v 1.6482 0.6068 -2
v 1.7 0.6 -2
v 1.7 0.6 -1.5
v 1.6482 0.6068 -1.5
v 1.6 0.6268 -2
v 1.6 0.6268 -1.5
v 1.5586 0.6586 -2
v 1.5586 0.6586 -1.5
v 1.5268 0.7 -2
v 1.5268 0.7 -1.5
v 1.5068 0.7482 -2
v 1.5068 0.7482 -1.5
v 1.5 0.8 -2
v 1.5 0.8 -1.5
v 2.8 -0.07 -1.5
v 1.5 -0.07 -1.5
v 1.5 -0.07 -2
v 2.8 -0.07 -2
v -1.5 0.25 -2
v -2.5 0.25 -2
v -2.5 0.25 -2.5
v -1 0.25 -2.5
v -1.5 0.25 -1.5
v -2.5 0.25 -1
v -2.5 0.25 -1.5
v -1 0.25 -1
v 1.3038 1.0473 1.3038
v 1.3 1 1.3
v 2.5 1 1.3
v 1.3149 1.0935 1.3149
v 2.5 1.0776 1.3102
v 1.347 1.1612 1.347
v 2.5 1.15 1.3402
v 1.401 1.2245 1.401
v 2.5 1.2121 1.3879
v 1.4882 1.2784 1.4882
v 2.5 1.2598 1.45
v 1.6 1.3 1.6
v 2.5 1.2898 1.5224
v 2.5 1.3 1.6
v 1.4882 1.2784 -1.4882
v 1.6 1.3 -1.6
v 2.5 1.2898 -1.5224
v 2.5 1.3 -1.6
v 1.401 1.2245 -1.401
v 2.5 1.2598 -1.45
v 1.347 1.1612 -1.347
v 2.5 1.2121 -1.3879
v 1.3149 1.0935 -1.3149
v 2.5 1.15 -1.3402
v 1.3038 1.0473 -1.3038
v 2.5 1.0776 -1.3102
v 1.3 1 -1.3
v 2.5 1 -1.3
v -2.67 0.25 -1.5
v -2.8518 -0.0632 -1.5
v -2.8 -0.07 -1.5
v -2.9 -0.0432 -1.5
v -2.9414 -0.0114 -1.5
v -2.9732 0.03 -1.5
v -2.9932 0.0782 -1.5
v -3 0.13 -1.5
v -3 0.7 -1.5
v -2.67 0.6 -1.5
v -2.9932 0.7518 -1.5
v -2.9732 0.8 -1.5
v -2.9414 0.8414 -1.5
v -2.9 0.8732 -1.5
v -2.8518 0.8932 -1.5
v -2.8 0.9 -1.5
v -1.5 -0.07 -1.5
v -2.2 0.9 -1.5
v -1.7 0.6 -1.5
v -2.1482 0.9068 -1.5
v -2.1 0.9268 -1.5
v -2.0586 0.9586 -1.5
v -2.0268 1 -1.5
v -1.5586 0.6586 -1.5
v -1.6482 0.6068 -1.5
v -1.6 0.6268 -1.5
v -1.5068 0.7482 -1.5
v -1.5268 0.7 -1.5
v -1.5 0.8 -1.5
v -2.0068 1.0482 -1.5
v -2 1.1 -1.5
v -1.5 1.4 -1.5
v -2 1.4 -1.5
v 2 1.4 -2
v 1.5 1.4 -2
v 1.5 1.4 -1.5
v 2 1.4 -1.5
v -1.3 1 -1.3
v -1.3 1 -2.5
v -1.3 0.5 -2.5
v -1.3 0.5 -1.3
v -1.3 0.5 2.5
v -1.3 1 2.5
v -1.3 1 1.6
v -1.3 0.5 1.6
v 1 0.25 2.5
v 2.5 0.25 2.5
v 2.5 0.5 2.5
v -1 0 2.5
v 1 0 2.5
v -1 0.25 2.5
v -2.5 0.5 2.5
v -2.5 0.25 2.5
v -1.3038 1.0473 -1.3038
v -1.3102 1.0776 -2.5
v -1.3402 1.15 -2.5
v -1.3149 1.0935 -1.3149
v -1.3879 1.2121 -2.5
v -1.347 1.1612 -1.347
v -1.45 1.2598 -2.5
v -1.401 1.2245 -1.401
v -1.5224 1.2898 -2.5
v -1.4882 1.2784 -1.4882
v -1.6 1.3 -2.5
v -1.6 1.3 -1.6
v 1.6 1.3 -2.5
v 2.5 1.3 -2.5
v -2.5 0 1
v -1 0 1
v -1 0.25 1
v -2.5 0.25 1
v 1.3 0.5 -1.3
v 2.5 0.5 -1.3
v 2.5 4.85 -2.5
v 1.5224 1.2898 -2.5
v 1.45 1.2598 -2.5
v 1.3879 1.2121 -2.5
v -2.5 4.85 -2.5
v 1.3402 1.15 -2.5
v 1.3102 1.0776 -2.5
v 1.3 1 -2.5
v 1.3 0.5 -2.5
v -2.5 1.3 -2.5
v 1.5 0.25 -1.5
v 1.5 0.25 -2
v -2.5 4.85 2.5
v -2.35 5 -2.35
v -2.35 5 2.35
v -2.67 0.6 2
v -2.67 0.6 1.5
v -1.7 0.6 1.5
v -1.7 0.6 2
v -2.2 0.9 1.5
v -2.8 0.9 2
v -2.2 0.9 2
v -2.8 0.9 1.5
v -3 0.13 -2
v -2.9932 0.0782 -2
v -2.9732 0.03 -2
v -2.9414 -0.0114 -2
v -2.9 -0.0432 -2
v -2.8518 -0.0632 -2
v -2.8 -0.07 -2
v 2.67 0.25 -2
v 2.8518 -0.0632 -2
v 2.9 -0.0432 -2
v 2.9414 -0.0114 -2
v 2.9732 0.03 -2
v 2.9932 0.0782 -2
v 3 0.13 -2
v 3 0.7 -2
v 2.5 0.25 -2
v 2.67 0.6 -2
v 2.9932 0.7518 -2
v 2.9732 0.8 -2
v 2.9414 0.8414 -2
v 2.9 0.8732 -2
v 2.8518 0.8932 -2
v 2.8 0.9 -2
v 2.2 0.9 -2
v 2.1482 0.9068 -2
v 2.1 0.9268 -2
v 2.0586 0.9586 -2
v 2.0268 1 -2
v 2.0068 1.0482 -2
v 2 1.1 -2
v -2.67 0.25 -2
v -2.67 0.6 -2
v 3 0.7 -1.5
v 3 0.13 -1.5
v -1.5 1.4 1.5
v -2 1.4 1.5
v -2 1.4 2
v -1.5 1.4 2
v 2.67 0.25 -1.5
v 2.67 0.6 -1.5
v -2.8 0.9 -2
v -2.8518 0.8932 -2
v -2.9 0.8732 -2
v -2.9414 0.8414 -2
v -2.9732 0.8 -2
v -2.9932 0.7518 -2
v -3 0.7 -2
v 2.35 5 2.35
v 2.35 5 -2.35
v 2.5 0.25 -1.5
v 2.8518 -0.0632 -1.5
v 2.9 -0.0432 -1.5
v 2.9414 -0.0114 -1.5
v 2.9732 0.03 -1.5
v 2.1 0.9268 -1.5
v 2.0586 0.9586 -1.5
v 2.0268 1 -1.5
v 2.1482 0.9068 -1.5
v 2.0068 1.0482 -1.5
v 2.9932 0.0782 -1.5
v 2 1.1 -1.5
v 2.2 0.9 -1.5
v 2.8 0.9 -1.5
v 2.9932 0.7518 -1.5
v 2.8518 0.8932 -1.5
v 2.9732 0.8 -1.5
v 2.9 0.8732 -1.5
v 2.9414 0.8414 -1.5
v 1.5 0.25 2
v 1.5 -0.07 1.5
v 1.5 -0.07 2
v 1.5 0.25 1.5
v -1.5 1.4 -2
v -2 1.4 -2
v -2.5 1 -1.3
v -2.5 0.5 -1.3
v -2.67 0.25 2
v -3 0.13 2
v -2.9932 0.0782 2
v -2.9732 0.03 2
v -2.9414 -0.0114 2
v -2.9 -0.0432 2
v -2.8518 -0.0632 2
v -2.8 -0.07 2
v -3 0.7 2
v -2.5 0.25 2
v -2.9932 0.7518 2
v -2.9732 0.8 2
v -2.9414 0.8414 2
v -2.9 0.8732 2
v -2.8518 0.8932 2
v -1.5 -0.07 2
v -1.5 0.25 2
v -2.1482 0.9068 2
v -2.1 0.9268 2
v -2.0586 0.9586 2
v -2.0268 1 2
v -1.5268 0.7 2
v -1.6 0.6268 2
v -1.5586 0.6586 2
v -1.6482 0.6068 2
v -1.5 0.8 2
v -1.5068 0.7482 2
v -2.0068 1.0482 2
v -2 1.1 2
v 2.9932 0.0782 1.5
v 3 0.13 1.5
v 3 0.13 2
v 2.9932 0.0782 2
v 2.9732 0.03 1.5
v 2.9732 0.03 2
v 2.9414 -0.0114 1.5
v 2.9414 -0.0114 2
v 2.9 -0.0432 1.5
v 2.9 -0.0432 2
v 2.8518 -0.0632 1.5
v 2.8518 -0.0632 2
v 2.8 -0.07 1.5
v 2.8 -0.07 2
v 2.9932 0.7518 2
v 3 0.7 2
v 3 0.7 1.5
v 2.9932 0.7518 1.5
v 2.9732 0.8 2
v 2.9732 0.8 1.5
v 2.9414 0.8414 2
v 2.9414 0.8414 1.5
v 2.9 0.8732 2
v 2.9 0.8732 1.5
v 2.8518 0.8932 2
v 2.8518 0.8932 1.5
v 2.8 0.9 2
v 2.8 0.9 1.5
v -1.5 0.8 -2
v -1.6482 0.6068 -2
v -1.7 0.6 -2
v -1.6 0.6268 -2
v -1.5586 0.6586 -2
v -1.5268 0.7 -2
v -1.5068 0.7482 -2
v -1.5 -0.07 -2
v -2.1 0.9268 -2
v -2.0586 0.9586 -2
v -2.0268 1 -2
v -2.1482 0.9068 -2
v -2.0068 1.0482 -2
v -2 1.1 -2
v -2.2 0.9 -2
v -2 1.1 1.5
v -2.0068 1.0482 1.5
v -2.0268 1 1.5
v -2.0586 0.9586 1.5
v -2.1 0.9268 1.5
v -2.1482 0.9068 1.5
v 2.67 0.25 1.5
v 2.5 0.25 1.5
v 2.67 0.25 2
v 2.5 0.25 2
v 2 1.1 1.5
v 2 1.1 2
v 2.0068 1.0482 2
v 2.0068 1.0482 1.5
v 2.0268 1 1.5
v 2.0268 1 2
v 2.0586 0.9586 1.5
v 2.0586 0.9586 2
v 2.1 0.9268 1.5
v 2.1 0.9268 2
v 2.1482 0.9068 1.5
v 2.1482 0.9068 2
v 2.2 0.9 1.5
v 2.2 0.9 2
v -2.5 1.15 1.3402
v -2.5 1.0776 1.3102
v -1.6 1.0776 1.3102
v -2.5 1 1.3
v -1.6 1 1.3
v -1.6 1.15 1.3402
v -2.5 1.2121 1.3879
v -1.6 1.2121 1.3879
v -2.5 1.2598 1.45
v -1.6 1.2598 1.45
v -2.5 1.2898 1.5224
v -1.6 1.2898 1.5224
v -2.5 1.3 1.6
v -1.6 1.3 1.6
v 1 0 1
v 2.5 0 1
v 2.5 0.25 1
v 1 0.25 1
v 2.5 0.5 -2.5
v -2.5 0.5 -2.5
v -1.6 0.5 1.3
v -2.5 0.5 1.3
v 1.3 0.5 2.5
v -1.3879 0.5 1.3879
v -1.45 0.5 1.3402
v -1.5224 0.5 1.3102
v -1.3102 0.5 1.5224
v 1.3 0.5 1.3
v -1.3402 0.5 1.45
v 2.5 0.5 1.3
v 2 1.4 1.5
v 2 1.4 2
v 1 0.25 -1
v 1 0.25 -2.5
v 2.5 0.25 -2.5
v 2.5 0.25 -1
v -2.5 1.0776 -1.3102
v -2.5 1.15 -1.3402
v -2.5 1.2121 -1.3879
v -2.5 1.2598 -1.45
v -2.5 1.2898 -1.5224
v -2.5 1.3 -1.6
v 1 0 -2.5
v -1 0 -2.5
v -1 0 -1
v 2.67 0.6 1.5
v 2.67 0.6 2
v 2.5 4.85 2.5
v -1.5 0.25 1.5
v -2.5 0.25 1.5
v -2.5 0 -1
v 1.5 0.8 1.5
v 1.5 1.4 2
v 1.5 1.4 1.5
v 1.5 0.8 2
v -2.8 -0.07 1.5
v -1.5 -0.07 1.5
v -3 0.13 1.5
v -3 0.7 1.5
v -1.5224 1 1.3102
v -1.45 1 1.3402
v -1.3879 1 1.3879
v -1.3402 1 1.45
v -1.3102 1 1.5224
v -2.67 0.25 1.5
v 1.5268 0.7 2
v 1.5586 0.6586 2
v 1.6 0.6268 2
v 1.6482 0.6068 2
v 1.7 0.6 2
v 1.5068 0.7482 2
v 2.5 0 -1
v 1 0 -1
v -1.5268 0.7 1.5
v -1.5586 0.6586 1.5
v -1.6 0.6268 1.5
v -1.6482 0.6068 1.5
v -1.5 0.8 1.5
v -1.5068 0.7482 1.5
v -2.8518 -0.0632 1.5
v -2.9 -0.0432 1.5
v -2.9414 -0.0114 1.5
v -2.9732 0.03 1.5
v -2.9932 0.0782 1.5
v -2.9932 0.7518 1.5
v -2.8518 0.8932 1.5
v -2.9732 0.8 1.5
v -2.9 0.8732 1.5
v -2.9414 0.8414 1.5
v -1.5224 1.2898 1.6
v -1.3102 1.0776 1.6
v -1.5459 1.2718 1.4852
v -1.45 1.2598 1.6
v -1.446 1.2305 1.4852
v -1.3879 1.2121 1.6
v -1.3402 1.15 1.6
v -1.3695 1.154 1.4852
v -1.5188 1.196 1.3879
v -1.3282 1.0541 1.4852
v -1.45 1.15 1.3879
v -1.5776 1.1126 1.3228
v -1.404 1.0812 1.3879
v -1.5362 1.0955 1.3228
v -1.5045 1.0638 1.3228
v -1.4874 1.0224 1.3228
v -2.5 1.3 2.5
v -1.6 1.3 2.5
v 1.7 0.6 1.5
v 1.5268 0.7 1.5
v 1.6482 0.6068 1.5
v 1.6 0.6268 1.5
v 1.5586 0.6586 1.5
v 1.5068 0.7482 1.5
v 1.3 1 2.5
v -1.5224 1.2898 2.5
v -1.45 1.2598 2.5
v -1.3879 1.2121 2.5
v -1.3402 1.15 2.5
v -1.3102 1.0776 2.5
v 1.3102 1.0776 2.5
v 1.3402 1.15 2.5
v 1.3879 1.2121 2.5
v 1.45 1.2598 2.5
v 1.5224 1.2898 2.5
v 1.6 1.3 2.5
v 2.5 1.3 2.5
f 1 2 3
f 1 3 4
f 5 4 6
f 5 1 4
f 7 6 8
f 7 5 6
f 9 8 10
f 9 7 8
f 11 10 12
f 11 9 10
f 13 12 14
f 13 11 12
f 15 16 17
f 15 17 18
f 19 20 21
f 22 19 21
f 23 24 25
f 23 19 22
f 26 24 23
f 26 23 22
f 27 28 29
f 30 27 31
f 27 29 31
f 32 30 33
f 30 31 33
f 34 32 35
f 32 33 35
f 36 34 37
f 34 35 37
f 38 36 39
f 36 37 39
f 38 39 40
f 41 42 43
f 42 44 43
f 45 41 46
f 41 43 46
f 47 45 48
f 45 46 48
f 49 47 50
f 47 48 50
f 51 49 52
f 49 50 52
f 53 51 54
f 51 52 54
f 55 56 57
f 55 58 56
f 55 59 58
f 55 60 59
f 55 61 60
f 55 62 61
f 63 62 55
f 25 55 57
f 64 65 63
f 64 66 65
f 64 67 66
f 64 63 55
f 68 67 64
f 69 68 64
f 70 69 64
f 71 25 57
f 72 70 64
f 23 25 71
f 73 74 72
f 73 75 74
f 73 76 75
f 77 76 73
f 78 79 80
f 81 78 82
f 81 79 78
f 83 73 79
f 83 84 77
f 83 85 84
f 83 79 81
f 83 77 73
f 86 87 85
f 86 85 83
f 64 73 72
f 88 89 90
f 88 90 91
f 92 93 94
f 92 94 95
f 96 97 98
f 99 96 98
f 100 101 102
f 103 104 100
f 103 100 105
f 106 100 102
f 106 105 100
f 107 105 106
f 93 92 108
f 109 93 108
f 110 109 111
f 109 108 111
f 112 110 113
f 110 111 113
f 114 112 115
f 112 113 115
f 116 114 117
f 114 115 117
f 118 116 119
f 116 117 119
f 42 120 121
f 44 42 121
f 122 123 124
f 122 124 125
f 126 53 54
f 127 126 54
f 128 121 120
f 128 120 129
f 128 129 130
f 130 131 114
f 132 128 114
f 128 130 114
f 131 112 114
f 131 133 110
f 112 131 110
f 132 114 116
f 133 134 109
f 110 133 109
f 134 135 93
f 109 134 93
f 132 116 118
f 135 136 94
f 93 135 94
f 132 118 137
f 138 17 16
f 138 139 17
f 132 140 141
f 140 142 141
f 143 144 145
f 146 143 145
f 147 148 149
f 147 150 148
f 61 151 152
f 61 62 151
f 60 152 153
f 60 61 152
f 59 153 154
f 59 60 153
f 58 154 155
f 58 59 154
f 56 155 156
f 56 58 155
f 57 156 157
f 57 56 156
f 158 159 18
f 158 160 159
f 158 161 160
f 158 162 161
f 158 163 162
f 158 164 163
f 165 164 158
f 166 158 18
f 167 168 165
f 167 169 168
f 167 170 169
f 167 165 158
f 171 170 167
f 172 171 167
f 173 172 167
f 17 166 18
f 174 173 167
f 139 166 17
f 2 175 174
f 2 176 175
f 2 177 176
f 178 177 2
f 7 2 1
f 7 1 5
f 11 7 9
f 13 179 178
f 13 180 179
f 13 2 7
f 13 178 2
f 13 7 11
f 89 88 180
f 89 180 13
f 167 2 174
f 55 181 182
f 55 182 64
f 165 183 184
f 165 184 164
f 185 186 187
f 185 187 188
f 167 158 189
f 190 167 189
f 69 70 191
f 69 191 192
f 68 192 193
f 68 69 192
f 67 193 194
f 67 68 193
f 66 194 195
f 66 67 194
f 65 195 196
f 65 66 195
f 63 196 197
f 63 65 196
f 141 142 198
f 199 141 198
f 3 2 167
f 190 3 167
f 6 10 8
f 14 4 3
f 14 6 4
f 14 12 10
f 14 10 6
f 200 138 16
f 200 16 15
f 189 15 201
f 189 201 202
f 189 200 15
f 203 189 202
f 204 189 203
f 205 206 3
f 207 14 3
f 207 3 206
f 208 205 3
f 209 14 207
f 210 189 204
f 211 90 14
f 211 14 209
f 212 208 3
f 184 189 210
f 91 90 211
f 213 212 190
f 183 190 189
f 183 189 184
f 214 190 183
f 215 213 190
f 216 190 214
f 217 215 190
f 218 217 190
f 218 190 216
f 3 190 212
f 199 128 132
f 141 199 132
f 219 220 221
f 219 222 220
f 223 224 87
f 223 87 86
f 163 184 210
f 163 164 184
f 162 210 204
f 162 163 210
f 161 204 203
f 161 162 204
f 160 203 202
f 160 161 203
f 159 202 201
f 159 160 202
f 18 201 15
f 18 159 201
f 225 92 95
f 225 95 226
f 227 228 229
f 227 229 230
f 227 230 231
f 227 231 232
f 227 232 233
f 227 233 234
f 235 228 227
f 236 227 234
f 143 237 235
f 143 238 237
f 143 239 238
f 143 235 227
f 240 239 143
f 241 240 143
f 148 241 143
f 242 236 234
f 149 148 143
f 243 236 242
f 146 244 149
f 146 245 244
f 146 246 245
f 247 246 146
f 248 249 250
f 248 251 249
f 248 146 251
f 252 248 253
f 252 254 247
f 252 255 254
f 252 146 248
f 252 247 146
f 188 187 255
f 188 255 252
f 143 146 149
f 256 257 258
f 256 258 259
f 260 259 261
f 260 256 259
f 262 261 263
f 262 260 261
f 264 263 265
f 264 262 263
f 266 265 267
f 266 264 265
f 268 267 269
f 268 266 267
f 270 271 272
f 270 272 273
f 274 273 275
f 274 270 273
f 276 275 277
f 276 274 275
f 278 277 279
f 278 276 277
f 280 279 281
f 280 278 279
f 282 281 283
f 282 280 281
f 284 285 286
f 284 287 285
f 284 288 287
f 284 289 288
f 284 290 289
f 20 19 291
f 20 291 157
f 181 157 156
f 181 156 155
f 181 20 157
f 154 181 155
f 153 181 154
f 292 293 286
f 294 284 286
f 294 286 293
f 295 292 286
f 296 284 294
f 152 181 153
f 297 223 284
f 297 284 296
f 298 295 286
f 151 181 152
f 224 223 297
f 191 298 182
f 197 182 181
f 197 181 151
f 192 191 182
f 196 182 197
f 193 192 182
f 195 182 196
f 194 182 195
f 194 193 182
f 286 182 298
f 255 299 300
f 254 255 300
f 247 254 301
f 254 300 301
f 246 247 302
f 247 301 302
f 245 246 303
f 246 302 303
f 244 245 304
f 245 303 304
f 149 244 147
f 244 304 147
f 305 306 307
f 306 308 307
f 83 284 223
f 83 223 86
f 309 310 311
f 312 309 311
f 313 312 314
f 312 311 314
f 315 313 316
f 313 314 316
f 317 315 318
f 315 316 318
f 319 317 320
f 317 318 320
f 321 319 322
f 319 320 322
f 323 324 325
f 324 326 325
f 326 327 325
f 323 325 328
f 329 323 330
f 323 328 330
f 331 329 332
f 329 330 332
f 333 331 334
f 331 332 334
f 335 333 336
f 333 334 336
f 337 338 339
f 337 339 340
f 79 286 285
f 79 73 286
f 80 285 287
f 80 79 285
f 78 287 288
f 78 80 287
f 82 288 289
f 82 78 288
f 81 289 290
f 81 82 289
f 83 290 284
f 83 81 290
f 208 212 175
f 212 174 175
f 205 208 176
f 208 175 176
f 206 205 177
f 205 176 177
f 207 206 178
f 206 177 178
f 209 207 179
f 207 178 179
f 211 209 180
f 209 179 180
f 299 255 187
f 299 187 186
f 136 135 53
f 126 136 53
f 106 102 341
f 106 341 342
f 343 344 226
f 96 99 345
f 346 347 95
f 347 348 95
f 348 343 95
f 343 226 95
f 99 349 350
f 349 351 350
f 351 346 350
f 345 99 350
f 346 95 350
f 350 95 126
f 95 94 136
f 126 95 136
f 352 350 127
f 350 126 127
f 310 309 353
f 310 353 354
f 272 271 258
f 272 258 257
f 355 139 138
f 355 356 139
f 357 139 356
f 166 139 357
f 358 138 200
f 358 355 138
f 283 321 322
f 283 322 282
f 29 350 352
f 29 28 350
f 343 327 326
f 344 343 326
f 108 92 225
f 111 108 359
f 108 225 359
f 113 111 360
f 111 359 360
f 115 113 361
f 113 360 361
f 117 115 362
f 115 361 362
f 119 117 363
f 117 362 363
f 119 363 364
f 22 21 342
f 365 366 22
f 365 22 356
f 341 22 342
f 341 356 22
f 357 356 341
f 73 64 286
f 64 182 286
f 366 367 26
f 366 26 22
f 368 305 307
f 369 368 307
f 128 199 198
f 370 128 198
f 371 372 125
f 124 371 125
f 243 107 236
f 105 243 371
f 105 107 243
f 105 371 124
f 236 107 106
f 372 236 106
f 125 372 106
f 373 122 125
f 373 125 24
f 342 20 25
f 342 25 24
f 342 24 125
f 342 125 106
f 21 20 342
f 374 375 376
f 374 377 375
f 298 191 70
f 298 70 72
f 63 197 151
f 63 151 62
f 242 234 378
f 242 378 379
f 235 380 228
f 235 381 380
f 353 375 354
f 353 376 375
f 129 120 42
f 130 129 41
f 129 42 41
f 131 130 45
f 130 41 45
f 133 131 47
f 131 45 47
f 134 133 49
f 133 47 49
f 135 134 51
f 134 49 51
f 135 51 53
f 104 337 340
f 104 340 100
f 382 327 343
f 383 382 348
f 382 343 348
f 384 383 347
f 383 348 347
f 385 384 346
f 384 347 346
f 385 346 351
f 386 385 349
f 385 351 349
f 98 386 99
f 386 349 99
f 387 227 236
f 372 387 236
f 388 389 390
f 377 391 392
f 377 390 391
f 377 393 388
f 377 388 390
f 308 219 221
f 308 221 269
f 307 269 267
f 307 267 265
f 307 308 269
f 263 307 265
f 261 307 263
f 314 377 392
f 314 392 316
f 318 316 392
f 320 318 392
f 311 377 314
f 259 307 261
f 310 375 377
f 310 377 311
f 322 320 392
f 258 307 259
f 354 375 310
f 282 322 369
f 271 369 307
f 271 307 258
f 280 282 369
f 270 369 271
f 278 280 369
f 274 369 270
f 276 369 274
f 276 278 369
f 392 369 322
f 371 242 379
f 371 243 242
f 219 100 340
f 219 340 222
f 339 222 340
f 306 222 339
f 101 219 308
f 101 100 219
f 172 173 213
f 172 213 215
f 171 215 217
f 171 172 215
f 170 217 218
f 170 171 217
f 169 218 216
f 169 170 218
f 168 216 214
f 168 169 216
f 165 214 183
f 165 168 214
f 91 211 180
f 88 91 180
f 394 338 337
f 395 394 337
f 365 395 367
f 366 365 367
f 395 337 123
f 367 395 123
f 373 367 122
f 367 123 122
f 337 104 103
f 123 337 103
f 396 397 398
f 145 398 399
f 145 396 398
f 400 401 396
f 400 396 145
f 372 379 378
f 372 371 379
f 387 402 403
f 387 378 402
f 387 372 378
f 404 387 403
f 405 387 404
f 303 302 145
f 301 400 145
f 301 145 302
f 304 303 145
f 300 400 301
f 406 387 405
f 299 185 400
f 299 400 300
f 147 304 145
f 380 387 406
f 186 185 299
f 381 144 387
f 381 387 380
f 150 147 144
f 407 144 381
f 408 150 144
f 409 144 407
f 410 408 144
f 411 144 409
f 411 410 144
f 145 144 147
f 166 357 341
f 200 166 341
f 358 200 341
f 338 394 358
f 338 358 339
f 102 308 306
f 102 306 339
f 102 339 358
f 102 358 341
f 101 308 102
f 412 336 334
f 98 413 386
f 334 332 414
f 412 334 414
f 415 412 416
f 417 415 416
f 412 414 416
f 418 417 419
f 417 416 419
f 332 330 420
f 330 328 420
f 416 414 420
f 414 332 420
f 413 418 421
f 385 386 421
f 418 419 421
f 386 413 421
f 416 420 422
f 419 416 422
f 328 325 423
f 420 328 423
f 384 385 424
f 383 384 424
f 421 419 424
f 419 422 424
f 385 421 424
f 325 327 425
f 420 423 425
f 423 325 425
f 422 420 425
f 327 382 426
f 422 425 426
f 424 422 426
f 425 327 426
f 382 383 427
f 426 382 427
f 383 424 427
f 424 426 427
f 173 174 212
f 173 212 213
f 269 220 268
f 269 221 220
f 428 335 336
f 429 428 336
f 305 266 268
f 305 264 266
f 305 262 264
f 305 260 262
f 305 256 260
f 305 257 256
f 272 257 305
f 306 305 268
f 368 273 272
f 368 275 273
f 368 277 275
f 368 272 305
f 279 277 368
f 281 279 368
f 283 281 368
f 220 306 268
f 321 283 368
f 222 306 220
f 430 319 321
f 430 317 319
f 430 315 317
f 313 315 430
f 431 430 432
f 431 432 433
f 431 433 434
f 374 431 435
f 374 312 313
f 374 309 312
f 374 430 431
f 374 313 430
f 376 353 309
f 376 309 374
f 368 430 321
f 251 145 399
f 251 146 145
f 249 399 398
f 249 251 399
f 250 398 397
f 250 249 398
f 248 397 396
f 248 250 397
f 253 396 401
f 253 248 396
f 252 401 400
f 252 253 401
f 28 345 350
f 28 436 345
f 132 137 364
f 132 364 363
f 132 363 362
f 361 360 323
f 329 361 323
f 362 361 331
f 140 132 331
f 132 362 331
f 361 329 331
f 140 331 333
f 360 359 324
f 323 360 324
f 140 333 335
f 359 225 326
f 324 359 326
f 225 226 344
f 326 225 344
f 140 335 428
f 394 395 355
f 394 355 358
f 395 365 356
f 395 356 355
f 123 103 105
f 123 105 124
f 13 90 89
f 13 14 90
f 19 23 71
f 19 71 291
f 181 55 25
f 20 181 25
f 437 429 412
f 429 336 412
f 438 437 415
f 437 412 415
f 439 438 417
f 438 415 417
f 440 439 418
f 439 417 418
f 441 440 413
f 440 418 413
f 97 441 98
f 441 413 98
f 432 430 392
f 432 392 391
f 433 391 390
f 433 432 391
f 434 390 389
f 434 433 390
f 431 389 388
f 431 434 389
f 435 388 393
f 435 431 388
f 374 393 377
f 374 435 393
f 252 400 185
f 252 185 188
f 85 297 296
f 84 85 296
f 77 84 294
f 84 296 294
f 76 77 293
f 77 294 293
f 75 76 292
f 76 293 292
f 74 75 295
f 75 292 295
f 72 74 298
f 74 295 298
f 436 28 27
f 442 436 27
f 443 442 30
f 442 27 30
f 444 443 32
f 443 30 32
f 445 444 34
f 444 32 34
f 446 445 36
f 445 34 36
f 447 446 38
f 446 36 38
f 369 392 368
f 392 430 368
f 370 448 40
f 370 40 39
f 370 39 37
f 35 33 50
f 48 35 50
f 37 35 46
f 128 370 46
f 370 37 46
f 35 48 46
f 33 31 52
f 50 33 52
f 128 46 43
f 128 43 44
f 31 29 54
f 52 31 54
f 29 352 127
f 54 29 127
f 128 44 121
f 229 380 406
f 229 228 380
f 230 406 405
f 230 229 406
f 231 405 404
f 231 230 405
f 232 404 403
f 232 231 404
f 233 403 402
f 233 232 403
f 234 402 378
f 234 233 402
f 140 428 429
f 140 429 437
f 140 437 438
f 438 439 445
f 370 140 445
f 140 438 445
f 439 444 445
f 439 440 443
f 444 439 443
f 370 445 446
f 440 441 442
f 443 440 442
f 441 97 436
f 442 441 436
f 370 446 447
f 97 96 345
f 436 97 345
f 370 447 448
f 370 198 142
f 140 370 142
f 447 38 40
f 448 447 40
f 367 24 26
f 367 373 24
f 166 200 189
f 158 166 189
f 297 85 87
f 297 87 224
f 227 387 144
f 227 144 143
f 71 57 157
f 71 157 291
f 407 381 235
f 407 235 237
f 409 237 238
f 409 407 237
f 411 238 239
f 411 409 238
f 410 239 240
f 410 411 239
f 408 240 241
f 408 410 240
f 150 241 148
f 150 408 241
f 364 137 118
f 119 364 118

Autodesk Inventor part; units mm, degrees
ref_plane "YZ Plane" through (0, 0, 0) normal (1, 0, 0) x (0, 1, 0)
ref_plane "XZ Plane" through (0, 0, 0) normal (0, 1, 0) x (-1, 0, 0)
ref_plane "XY Plane" through (0, 0, 0) normal (0, 0, 1) x (1, 0, 0)
sketch "Эскиз1" plane through (0, 0, 0) normal (0, 1, 0) x (-1, 0, 0)
  line L0 (2.5, -2.5) -> (-2.5, -2.5)
  line L1 (-2.5, -2.5) -> (-2.5, 2.5)
  line L2 (-2.5, 2.5) -> (2.5, 2.5)
  line L3 (2.5, 2.5) -> (2.5, -2.5)
  line L4 (2.5, -2.5) -> (-2.5, 2.5) construction
  line L5 (-2.5, -2.5) -> (2.5, 2.5) construction
  point P0 (0, 0)
  dimension "d0" = 5
  dimension "d1" = 5
extrude "Выдавливание1" add sketch "Эскиз1" along normal blind 0.5
sketch "Эскиз2" plane through (0, 0, 0) normal (0, -1, 0) x (1, 0, 0)
  line L0 (1, 2.5) -> (2.5, 2.5)
  line L1 (2.5, 2.5) -> (2.5, 1)
  line L2 (2.5, 1) -> (1, 1)
  line L3 (1, 1) -> (1, 2.5)
  line L4 (1, 2.5) -> (2.5, 1) construction
  line L5 (2.5, 2.5) -> (1, 1) construction
  line L6 (-2.5, 2.5) -> (2.5, 2.5) projected
  line L7 (2.5, 2.5) -> (2.5, -2.5) projected
  line L8 (-2.5, -2.5) -> (-2.5, 2.5) projected
  line L9 (2.5, -2.5) -> (-2.5, -2.5) projected
  line L10 (-2.5, 2.5) -> (-1, 2.5)
  line L11 (-1, 2.5) -> (-1, 1)
  line L12 (-1, 1) -> (-2.5, 1)
  line L13 (-2.5, 1) -> (-2.5, 2.5)
  line L14 (-2.5, 2.5) -> (-1, 1) construction
  line L15 (-1, 2.5) -> (-2.5, 1) construction
  line L16 (1, -1) -> (2.5, -1)
  line L17 (2.5, -1) -> (2.5, -2.5)
  line L18 (2.5, -2.5) -> (1, -2.5)
  line L19 (1, -2.5) -> (1, -1)
  line L20 (-2.5, -1) -> (-1, -1)
  line L21 (-1, -1) -> (-1, -2.5)
  line L22 (-1, -2.5) -> (-2.5, -2.5)
  line L23 (-2.5, -2.5) -> (-2.5, -1)
  point P0 (0, 0)
  point P1 (1.75, 1.75)
  point P2 (-1.75, 1.75)
  point P3 (-2.5, -1)
  point P4 (-2.5, 1)
  dimension "d4" = 1.5
  dimension "d5" = 1.5
  dimension "d6" = 1.5
  dimension "d7" = 1.5
  dimension "d8" = 1.5
  dimension "d9" = 1.5
  dimension "d10" = 1.5
  dimension "d11" = 1.5
extrude "Выдавливание2" cut sketch "Эскиз2" against normal blind 0.25 contours L0 L1 L2 L3 | L11 L12 L8 L6 | L7 L9 L19 L16 | L20 L21 L9 L8
sketch "Эскиз3" plane through (0, 0.5, 0) normal (0, 1, 0) x (1, 0, 0)
  line L0 (2.5, -2.5) -> (2.5, 2.5) projected
  line L1 (-2.5, 2.5) -> (2.5, 2.5)
  line L2 (2.5, 2.5) -> (2.5, -2.5)
  line L3 (2.5, -2.5) -> (-2.5, -2.5)
  line L4 (-2.5, -2.5) -> (-2.5, 2.5)
  line L5 (-2.5, 2.5) -> (2.5, -2.5) construction
  line L6 (2.5, 2.5) -> (-2.5, -2.5) construction
  point P0 (0, 0)
extrude "Выдавливание3" add sketch "Эскиз3" along normal blind 0.8 separate body
sketch "Эскиз4" plane through (0, 1.3, 0) normal (0, 1, 0) x (1, 0, 0)
  line L0 (-2.5, -2.5) -> (-1, -2.5) projected
  line L1 (-2.5, -2.5) -> (-1.3, -2.5)
  line L2 (-1.3, -2.5) -> (-1.3, -1.3)
  line L3 (-1.3, -1.3) -> (-2.5, -1.3)
  line L4 (-2.5, -1.3) -> (-2.5, -2.5)
  line L5 (-2.5, -2.5) -> (2.5, -2.5) projected
  line L6 (2.5, -2.5) -> (1.3, -2.5)
  line L7 (1.3, -2.5) -> (1.3, -1.3)
  line L8 (1.3, -1.3) -> (2.5, -1.3)
  line L9 (2.5, -1.3) -> (2.5, -2.5)
  line L10 (2.5, 2.5) -> (-2.5, 2.5) projected
  line L11 (2.5, 2.5) -> (1.3, 2.5)
  line L12 (1.3, 2.5) -> (1.3, 1.3)
  line L13 (1.3, 1.3) -> (2.5, 1.3)
  line L14 (2.5, 1.3) -> (2.5, 2.5)
  line L15 (-2.5, 2.5) -> (-1.3, 2.5)
  line L16 (-1.3, 2.5) -> (-1.3, 1.3)
  line L17 (-1.3, 1.3) -> (-2.5, 1.3)
  line L18 (-2.5, 1.3) -> (-2.5, 2.5)
  point P0 (0, 0)
  dimension "d16" = 1.2
  dimension "d17" = 1.2
  dimension "d18" = 1.2
  dimension "d19" = 1.2
  dimension "d20" = 1.2
  dimension "d21" = 1.2
  dimension "d22" = 1.2
  dimension "d23" = 1.2
extrude "Выдавливание4" cut sketch "Эскиз4" against normal blind 0.8 bodies 2
sketch "Эскиз5" plane through (0, 1.3, 0) normal (0, 1, 0) x (1, 0, 0)
  line L0 (2.5, -2.5) -> (2.5, 2.5) projected
  line L1 (-2.5, -2.5) -> (2.5, -2.5)
  line L2 (2.5, -2.5) -> (2.5, 2.5)
  line L3 (2.5, 2.5) -> (-2.5, 2.5)
  line L4 (-2.5, 2.5) -> (-2.5, -2.5)
  line L5 (-2.5, -2.5) -> (2.5, 2.5) construction
  line L6 (2.5, -2.5) -> (-2.5, 2.5) construction
  point P0 (0, 0)
extrude "Выдавливание5" add sketch "Эскиз5" along normal blind 3.7 bodies 2
sketch "Эскиз6" plane through (0, 5, 0) normal (0, 1, 0) x (1, 0, 0)
  point P0 (0, 0)
chamfer "Фаска1" distance 0.15 angle 45 4 edges at (0, 5, 2.5) (-2.5, 5, 0) (0, 5, -2.5) (2.5, 5, 0)
fillet "Сопряжение1" radius 0.3 7 edges at (1.3, 1.3, 1.9) (-1.3, 1.3, 1.9) (1.9, 1.3, 1.3) (1.3, 1.3, -1.9) (1.9, 1.3, -1.3) (-1.9, 1.3, -1.3) (-1.3, 1.3, -1.9)
fillet "Сопряжение2" radius 0.3 3 edges at (-1.3879, 1.2121, 1.3) (-1.3, 0.75, 1.3) (-2.05, 1.3, 1.3)
sketch "Эскиз7" plane through (0, 0.25, 0) normal (0, -1, 0) x (1, 0, 0)
  line L0 (1.5, -1.5) -> (3, -1.5)
  line L1 (3, -1.5) -> (3, -2)
  line L2 (3, -2) -> (1.5, -2)
  line L3 (1.5, -2) -> (1.5, -1.5)
  line L4 (1.5, -1.5) -> (3, -2) construction
  line L5 (3, -1.5) -> (1.5, -2) construction
  line L6 (2.5, -1) -> (2.5, -2.5) projected
  line L7 (-3, -1.5) -> (-1.5, -1.5)
  line L8 (-1.5, -1.5) -> (-1.5, -2)
  line L9 (-1.5, -2) -> (-3, -2)
  line L10 (-3, -2) -> (-3, -1.5)
  line L11 (-3, -1.5) -> (-1.5, -2) construction
  line L12 (-1.5, -1.5) -> (-3, -2) construction
  line L13 (1.5, -1.5) -> (3, -1.5)
  line L14 (3, -1.5) -> (3, -2)
  line L15 (3, -2) -> (1.5, -2)
  line L16 (1.5, -2) -> (1.5, -1.5)
  line L17 (1.5, -1.5) -> (3, -2) construction
  line L18 (3, -1.5) -> (1.5, -2) construction
  line L19 (-3, -1.5) -> (-1.5, -1.5)
  line L20 (-3, -1.5) -> (-1.5, -2) construction
  line L21 (-1.5, -1.5) -> (-3, -2) construction
  line L22 (-3, -2) -> (-3, -1.5)
  line L23 (-1.5, -2) -> (-3, -2)
  line L24 (-1.5, -1.5) -> (-1.5, -2)
  line L25 (1.5, 2) -> (3, 2)
  line L26 (3, 2) -> (3, 1.5)
  line L27 (3, 1.5) -> (1.5, 1.5)
  line L28 (1.5, 1.5) -> (1.5, 2)
  line L29 (1.5, 2) -> (3, 1.5) construction
  line L30 (3, 2) -> (1.5, 1.5) construction
  line L31 (-3, 2) -> (-1.5, 2)
  line L32 (-3, 2) -> (-1.5, 1.5) construction
  line L33 (-1.5, 2) -> (-3, 1.5) construction
  line L34 (-3, 1.5) -> (-3, 2)
  line L35 (-1.5, 1.5) -> (-3, 1.5)
  line L36 (-1.5, 2) -> (-1.5, 1.5)
  line L37 (-1, 1) -> (-2.5, 1) projected
  line L38 (-2.5, 1) -> (-2.5, 1.6917)
  line L39 (-2.5, 1) -> (-2.5, 2.5) projected
  point P0 (0, 0)
  point P1 (2.25, -1.75)
  point P2 (-2.25, -1.75)
  point P3 (2.25, -1.75)
  point P4 (-2.25, -1.75)
  point P5 (2.25, 1.75)
  point P6 (-2.25, 1.75)
  point P7 (-2.5, 2)
  point P8 (-2.5, 1.5)
  dimension "d33" = 1.5
  dimension "d34" = 0.5
  dimension "d41" = 1.5
  dimension "d42" = 0.5
  dimension "d45" = 6
  dimension "d55" = 1.5
  dimension "d56" = 0.5
  dimension "d61" = 1.5
  dimension "d62" = 0.5
  dimension "d63" = 6
  dimension "d64" = 1.5
  dimension "d65" = 0.5
  dimension "d70" = 1.5
  dimension "d71" = 0.5
extrude "Выдавливание6" add sketch "Эскиз7" along normal blind 0.32 bodies 1
sketch "Эскиз8" plane through (0, 0.25, 0) normal (0, 1, 0) x (1, 0, 0)
  line L0 (2.5, 2) -> (3, 2) projected
  line L1 (3, 1.5) -> (2.5, 1.5) projected
  line L2 (3, 2) -> (2.67, 2)
  line L3 (2.67, 2) -> (2.67, 1.5)
  line L4 (2.67, 1.5) -> (3, 1.5)
  line L5 (3, 1.5) -> (3, 2)
  line L6 (3, 2) -> (2.67, 2)
  line L7 (2.67, 2) -> (2.67, 1.5)
  line L8 (2.67, 1.5) -> (3, 1.5)
  line L9 (3, 1.5) -> (3, 2)
  line L10 (3, -1.5) -> (3, -2) projected
  line L11 (3, -1.5) -> (2.8757, -1.5)
  line L12 (2.5, -1.5) -> (3, -1.5) projected
  line L13 (3, -1.5) -> (2.67, -1.5)
  line L14 (2.67, -1.5) -> (2.67, -2)
  line L15 (2.67, -2) -> (3, -2)
  line L16 (3, -2) -> (3, -1.5)
  line L17 (3, -1.5) -> (2.67, -1.5)
  line L18 (2.67, -1.5) -> (2.67, -2)
  line L19 (2.67, -2) -> (3, -2)
  line L20 (3, -2) -> (3, -1.5)
  line L21 (3, 2) -> (2.67, 2)
  line L22 (2.67, 2) -> (2.67, 1.5)
  line L23 (2.67, 1.5) -> (3, 1.5)
  line L24 (3, 1.5) -> (3, 2)
  line L25 (3, 2) -> (2.67, 2)
  line L26 (2.67, 2) -> (2.67, 1.5)
  line L27 (2.67, 1.5) -> (3, 1.5)
  line L28 (3, 1.5) -> (3, 2)
  line L29 (-2.67, -1.5) -> (-2.67, -2)
  line L30 (-2.67, -1.5) -> (-2.7943, -1.5)
  line L31 (-3, -1.5) -> (-2.67, -1.5)
  line L32 (-2.67, -1.5) -> (-3, -1.5)
  line L33 (-3, -1.5) -> (-3, -2)
  line L34 (-3, -2) -> (-2.67, -2)
  line L35 (-2.67, -2) -> (-2.67, -1.5)
  line L36 (-2.67, -1.5) -> (-3, -1.5)
  line L37 (-3, -1.5) -> (-3, -2)
  line L38 (-3, -2) -> (-2.67, -2)
  line L39 (-2.67, -2) -> (-2.67, -1.5)
  line L40 (-3, -2) -> (-3, -1.5) projected
  line L41 (-3, -2) -> (-3, -1.86)
  line L42 (-1.67, -0.5) -> (-1.67, -1)
  line L43 (-1.67, -0.5) -> (-1.7943, -0.5)
  line L44 (-2, -0.5) -> (-1.67, -0.5)
  line L45 (-1.67, -0.5) -> (-2, -0.5)
  line L46 (-1.67, -0.5) -> (-2, -0.5)
  line L47 (-2, -1) -> (-1.67, -1)
  line L48 (-1.67, -1) -> (-1.67, -0.5)
  line L49 (-2, -1) -> (-1.67, -1)
  line L50 (-1.67, -1) -> (-1.67, -0.5)
  line L51 (-2, -0.5) -> (-2, -1)
  line L52 (-2, -0.5) -> (-2, -1)
  line L53 (-2, -1) -> (-2, -0.5)
  line L54 (-2, -1) -> (-2, -0.86)
  line L55 (-0.67, 0.5) -> (-0.67, 0)
  line L56 (-0.67, 0.5) -> (-0.7943, 0.5)
  line L57 (-1, 0.5) -> (-0.67, 0.5)
  line L58 (-0.67, 0.5) -> (-1, 0.5)
  line L59 (-0.67, 0.5) -> (-1, 0.5)
  line L60 (-1, 0) -> (-0.67, 0)
  line L61 (-0.67, 0) -> (-0.67, 0.5)
  line L62 (-1, 0) -> (-0.67, 0)
  line L63 (-0.67, 0) -> (-0.67, 0.5)
  line L64 (-1, 0.5) -> (-1, 0)
  line L65 (-1, 0.5) -> (-1, 0)
  line L66 (-1, 0) -> (-1, 0.5)
  line L67 (-1, 0) -> (-1, 0.14)
  line L68 (-1.67, -0.5) -> (-1.67, -1)
  line L69 (-1.67, -0.5) -> (-1.7943, -0.5)
  line L70 (-2, -0.5) -> (-1.67, -0.5)
  line L71 (-1.67, -0.5) -> (-2, -0.5)
  line L72 (-1.67, -0.5) -> (-2, -0.5)
  line L73 (-2, -1) -> (-1.67, -1)
  line L74 (-1.67, -1) -> (-1.67, -0.5)
  line L75 (-2, -1) -> (-1.67, -1)
  line L76 (-1.67, -1) -> (-1.67, -0.5)
  line L77 (-2, -0.5) -> (-2, -1)
  line L78 (-2, -0.5) -> (-2, -1)
  line L79 (-2, -1) -> (-2, -0.5)
  line L80 (-2, -1) -> (-2, -0.86)
  line L81 (-0.67, 0.5) -> (-0.67, 0)
  line L82 (-0.67, 0.5) -> (-0.7943, 0.5)
  line L83 (-1, 0.5) -> (-0.67, 0.5)
  line L84 (-0.67, 0.5) -> (-1, 0.5)
  line L85 (-0.67, 0.5) -> (-1, 0.5)
  line L86 (-1, 0) -> (-0.67, 0)
  line L87 (-0.67, 0) -> (-0.67, 0.5)
  line L88 (-1, 0) -> (-0.67, 0)
  line L89 (-0.67, 0) -> (-0.67, 0.5)
  line L90 (-1, 0.5) -> (-1, 0)
  line L91 (-1, 0.5) -> (-1, 0)
  line L92 (-1, 0) -> (-1, 0.5)
  line L93 (-1, 0) -> (-1, 0.14)
  line L94 (0.33, 1.5) -> (0.33, 1)
  line L95 (0.33, 1.5) -> (0.2057, 1.5)
  line L96 (0, 1.5) -> (0.33, 1.5)
  line L97 (0.33, 1.5) -> (0, 1.5)
  line L98 (0.33, 1.5) -> (0, 1.5)
  line L99 (0, 1) -> (0.33, 1)
  line L100 (0.33, 1) -> (0.33, 1.5)
  line L101 (0, 1) -> (0.33, 1)
  line L102 (0.33, 1) -> (0.33, 1.5)
  line L103 (0, 1.5) -> (0, 1)
  line L104 (0, 1.5) -> (0, 1)
  line L105 (0, 1) -> (0, 1.5)
  line L106 (0, 1) -> (0, 1.14)
  line L107 (-3, 1.5) -> (-3, 2) projected
  line L108 (-3, 1.5) -> (-3, 1.6267)
  line L109 (1.33, 2.5) -> (1.33, 2)
  line L110 (1.33, 2.5) -> (1.2057, 2.5)
  line L111 (1, 2.5) -> (1.33, 2.5)
  line L112 (1.33, 2.5) -> (1, 2.5)
  line L113 (1.33, 2.5) -> (1, 2.5)
  line L114 (1, 2) -> (1.33, 2)
  line L115 (1.33, 2) -> (1.33, 2.5)
  line L116 (1, 2) -> (1.33, 2)
  line L117 (1.33, 2) -> (1.33, 2.5)
  line L118 (1, 2.5) -> (1, 2)
  line L119 (1, 2.5) -> (1, 2)
  line L120 (1, 2) -> (1, 2.5)
  line L121 (1, 2) -> (1, 2.14)
  line L122 (-2.67, 2) -> (-2.67, 1.5)
  line L123 (-2.67, 2) -> (-2.7943, 2)
  line L124 (-3, 2) -> (-2.67, 2)
  line L125 (-2.67, 2) -> (-3, 2)
  line L126 (-2.67, 2) -> (-3, 2)
  line L127 (-3, 1.5) -> (-2.67, 1.5)
  line L128 (-2.67, 1.5) -> (-2.67, 2)
  line L129 (-3, 1.5) -> (-2.67, 1.5)
  line L130 (-2.67, 1.5) -> (-2.67, 2)
  line L131 (-3, 2) -> (-3, 1.5)
  line L132 (-3, 2) -> (-3, 1.5)
  line L133 (-3, 1.5) -> (-3, 1.64)
  line L134 (-2.67, -1.5) -> (-2.67, -2)
  line L135 (-2.67, -1.5) -> (-2.7943, -1.5)
  line L136 (-3, -1.5) -> (-2.67, -1.5)
  line L137 (-2.67, -1.5) -> (-3, -1.5)
  line L138 (-2.67, -1.5) -> (-3, -1.5)
  line L139 (-3, -2) -> (-2.67, -2)
  line L140 (-2.67, -2) -> (-2.67, -1.5)
  line L141 (-3, -2) -> (-2.67, -2)
  line L142 (-2.67, -2) -> (-2.67, -1.5)
  line L143 (-3, -1.5) -> (-3, -2)
  line L144 (-3, -1.5) -> (-3, -2)
  line L145 (-3, -2) -> (-3, -1.86)
  point P0 (0, 0)
extrude "Выдавливание7" add sketch "Эскиз8" along normal blind 0.35 contours L0 L5 L1 L3 | L10 L15 L14 L12 L11 | L29 L34 L33 L31 L30 | L107 L124 L123 L122 L127 bodies 1
sketch "Эскиз10" plane through (0, 0.6, 0) normal (0, 1, 0) x (1, 0, 0)
  line L0 (3, -1.5) -> (2.67, -1.5) projected
  line L1 (2.67, -2) -> (3, -2) projected
  line L2 (3, -1.5) -> (3, -2)
  line L3 (3, -2) -> (1.5, -2)
  line L4 (1.5, -2) -> (1.5, -1.5)
  line L5 (1.5, -1.5) -> (3, -1.5)
  line L6 (3, 1.5) -> (3, 2) projected
  line L7 (3, 2) -> (3, 1.5)
  line L8 (3, 1.5) -> (1.5, 1.5)
  line L9 (1.5, 1.5) -> (1.5, 2)
  line L10 (1.5, 2) -> (3, 2)
  line L11 (-3, 2) -> (-3, 1.5) projected
  line L12 (-3, 1.5) -> (-3, 2)
  line L13 (-3, 2) -> (-1.5, 2)
  line L14 (-1.5, 2) -> (-1.5, 1.5)
  line L15 (-1.5, 1.5) -> (-3, 1.5)
  line L16 (-3, -2) -> (-3, -1.5)
  line L17 (-3, -1.5) -> (-1.5, -1.5)
  line L18 (-1.5, -1.5) -> (-1.5, -2)
  line L19 (-1.5, -2) -> (-3, -2)
  point P0 (0, 0)
  dimension "d77" = 1.5
  dimension "d78" = 1.5
  dimension "d79" = 1.5
  dimension "d80" = 1.5
extrude "Выдавливание8" add sketch "Эскиз10" along normal blind 0.3 bodies 1
sketch "Эскиз11" plane through (0, 0.9, 0) normal (0, 1, 0) x (1, 0, 0)
  line L0 (-1.5, 1.5) -> (-1.5, 2) projected
  line L1 (-2.5, 1.5) -> (-1.5, 1.5) projected
  line L2 (-1.5, 2) -> (-1.5, 1.5)
  line L3 (-1.5, 1.5) -> (-2, 1.5)
  line L4 (-2, 1.5) -> (-2, 2)
  line L5 (-2, 2) -> (-1.5, 2)
  line L6 (-1.5, -2) -> (-1.5, -1.5) projected
  line L7 (-2.5, -2) -> (-1.5, -2) projected
  line L8 (-1.5, -1.5) -> (-1.5, -2)
  line L9 (-1.5, -2) -> (-2, -2)
  line L10 (-2, -2) -> (-2, -1.5)
  line L11 (-2, -1.5) -> (-1.5, -1.5)
  line L12 (1.5, -1.5) -> (1.5, -2) projected
  line L13 (1.5, -2) -> (1.5, -1.5)
  line L14 (1.5, -1.5) -> (2, -1.5)
  line L15 (2, -1.5) -> (2, -2)
  line L16 (2, -2) -> (1.5, -2)
  line L17 (1.5, 2) -> (1.5, 1.5) projected
  line L18 (1.5, 2) -> (1.5, 1.5)
  line L19 (1.5, 1.5) -> (2, 1.5)
  line L20 (2, 1.5) -> (2, 2)
  line L21 (2, 2) -> (1.5, 2)
  point P0 (0, 0)
extrude "Выдавливание9" add sketch "Эскиз11" along normal blind 0.5 bodies 1
fillet "Сопряжение3" radius 0.2 8 edges at (3, -0.07, -1.75) (3, 0.9, -1.75) (3, 0.9, 1.75) (3, -0.07, 1.75) (-3, -0.07, 1.75) (-3, -0.07, -1.75) (-3, 0.9, 1.75) (-3, 0.9, -1.75)
fillet "Сопряжение4" radius 0.2 8 edges at (1.5, 0.6, -1.75) (2, 0.9, -1.75) (2, 0.9, 1.75) (1.5, 0.6, 1.75) (-1.5, 0.6, 1.75) (-2, 0.9, 1.75) (-2, 0.9, -1.75) (-1.5, 0.6, -1.75)
